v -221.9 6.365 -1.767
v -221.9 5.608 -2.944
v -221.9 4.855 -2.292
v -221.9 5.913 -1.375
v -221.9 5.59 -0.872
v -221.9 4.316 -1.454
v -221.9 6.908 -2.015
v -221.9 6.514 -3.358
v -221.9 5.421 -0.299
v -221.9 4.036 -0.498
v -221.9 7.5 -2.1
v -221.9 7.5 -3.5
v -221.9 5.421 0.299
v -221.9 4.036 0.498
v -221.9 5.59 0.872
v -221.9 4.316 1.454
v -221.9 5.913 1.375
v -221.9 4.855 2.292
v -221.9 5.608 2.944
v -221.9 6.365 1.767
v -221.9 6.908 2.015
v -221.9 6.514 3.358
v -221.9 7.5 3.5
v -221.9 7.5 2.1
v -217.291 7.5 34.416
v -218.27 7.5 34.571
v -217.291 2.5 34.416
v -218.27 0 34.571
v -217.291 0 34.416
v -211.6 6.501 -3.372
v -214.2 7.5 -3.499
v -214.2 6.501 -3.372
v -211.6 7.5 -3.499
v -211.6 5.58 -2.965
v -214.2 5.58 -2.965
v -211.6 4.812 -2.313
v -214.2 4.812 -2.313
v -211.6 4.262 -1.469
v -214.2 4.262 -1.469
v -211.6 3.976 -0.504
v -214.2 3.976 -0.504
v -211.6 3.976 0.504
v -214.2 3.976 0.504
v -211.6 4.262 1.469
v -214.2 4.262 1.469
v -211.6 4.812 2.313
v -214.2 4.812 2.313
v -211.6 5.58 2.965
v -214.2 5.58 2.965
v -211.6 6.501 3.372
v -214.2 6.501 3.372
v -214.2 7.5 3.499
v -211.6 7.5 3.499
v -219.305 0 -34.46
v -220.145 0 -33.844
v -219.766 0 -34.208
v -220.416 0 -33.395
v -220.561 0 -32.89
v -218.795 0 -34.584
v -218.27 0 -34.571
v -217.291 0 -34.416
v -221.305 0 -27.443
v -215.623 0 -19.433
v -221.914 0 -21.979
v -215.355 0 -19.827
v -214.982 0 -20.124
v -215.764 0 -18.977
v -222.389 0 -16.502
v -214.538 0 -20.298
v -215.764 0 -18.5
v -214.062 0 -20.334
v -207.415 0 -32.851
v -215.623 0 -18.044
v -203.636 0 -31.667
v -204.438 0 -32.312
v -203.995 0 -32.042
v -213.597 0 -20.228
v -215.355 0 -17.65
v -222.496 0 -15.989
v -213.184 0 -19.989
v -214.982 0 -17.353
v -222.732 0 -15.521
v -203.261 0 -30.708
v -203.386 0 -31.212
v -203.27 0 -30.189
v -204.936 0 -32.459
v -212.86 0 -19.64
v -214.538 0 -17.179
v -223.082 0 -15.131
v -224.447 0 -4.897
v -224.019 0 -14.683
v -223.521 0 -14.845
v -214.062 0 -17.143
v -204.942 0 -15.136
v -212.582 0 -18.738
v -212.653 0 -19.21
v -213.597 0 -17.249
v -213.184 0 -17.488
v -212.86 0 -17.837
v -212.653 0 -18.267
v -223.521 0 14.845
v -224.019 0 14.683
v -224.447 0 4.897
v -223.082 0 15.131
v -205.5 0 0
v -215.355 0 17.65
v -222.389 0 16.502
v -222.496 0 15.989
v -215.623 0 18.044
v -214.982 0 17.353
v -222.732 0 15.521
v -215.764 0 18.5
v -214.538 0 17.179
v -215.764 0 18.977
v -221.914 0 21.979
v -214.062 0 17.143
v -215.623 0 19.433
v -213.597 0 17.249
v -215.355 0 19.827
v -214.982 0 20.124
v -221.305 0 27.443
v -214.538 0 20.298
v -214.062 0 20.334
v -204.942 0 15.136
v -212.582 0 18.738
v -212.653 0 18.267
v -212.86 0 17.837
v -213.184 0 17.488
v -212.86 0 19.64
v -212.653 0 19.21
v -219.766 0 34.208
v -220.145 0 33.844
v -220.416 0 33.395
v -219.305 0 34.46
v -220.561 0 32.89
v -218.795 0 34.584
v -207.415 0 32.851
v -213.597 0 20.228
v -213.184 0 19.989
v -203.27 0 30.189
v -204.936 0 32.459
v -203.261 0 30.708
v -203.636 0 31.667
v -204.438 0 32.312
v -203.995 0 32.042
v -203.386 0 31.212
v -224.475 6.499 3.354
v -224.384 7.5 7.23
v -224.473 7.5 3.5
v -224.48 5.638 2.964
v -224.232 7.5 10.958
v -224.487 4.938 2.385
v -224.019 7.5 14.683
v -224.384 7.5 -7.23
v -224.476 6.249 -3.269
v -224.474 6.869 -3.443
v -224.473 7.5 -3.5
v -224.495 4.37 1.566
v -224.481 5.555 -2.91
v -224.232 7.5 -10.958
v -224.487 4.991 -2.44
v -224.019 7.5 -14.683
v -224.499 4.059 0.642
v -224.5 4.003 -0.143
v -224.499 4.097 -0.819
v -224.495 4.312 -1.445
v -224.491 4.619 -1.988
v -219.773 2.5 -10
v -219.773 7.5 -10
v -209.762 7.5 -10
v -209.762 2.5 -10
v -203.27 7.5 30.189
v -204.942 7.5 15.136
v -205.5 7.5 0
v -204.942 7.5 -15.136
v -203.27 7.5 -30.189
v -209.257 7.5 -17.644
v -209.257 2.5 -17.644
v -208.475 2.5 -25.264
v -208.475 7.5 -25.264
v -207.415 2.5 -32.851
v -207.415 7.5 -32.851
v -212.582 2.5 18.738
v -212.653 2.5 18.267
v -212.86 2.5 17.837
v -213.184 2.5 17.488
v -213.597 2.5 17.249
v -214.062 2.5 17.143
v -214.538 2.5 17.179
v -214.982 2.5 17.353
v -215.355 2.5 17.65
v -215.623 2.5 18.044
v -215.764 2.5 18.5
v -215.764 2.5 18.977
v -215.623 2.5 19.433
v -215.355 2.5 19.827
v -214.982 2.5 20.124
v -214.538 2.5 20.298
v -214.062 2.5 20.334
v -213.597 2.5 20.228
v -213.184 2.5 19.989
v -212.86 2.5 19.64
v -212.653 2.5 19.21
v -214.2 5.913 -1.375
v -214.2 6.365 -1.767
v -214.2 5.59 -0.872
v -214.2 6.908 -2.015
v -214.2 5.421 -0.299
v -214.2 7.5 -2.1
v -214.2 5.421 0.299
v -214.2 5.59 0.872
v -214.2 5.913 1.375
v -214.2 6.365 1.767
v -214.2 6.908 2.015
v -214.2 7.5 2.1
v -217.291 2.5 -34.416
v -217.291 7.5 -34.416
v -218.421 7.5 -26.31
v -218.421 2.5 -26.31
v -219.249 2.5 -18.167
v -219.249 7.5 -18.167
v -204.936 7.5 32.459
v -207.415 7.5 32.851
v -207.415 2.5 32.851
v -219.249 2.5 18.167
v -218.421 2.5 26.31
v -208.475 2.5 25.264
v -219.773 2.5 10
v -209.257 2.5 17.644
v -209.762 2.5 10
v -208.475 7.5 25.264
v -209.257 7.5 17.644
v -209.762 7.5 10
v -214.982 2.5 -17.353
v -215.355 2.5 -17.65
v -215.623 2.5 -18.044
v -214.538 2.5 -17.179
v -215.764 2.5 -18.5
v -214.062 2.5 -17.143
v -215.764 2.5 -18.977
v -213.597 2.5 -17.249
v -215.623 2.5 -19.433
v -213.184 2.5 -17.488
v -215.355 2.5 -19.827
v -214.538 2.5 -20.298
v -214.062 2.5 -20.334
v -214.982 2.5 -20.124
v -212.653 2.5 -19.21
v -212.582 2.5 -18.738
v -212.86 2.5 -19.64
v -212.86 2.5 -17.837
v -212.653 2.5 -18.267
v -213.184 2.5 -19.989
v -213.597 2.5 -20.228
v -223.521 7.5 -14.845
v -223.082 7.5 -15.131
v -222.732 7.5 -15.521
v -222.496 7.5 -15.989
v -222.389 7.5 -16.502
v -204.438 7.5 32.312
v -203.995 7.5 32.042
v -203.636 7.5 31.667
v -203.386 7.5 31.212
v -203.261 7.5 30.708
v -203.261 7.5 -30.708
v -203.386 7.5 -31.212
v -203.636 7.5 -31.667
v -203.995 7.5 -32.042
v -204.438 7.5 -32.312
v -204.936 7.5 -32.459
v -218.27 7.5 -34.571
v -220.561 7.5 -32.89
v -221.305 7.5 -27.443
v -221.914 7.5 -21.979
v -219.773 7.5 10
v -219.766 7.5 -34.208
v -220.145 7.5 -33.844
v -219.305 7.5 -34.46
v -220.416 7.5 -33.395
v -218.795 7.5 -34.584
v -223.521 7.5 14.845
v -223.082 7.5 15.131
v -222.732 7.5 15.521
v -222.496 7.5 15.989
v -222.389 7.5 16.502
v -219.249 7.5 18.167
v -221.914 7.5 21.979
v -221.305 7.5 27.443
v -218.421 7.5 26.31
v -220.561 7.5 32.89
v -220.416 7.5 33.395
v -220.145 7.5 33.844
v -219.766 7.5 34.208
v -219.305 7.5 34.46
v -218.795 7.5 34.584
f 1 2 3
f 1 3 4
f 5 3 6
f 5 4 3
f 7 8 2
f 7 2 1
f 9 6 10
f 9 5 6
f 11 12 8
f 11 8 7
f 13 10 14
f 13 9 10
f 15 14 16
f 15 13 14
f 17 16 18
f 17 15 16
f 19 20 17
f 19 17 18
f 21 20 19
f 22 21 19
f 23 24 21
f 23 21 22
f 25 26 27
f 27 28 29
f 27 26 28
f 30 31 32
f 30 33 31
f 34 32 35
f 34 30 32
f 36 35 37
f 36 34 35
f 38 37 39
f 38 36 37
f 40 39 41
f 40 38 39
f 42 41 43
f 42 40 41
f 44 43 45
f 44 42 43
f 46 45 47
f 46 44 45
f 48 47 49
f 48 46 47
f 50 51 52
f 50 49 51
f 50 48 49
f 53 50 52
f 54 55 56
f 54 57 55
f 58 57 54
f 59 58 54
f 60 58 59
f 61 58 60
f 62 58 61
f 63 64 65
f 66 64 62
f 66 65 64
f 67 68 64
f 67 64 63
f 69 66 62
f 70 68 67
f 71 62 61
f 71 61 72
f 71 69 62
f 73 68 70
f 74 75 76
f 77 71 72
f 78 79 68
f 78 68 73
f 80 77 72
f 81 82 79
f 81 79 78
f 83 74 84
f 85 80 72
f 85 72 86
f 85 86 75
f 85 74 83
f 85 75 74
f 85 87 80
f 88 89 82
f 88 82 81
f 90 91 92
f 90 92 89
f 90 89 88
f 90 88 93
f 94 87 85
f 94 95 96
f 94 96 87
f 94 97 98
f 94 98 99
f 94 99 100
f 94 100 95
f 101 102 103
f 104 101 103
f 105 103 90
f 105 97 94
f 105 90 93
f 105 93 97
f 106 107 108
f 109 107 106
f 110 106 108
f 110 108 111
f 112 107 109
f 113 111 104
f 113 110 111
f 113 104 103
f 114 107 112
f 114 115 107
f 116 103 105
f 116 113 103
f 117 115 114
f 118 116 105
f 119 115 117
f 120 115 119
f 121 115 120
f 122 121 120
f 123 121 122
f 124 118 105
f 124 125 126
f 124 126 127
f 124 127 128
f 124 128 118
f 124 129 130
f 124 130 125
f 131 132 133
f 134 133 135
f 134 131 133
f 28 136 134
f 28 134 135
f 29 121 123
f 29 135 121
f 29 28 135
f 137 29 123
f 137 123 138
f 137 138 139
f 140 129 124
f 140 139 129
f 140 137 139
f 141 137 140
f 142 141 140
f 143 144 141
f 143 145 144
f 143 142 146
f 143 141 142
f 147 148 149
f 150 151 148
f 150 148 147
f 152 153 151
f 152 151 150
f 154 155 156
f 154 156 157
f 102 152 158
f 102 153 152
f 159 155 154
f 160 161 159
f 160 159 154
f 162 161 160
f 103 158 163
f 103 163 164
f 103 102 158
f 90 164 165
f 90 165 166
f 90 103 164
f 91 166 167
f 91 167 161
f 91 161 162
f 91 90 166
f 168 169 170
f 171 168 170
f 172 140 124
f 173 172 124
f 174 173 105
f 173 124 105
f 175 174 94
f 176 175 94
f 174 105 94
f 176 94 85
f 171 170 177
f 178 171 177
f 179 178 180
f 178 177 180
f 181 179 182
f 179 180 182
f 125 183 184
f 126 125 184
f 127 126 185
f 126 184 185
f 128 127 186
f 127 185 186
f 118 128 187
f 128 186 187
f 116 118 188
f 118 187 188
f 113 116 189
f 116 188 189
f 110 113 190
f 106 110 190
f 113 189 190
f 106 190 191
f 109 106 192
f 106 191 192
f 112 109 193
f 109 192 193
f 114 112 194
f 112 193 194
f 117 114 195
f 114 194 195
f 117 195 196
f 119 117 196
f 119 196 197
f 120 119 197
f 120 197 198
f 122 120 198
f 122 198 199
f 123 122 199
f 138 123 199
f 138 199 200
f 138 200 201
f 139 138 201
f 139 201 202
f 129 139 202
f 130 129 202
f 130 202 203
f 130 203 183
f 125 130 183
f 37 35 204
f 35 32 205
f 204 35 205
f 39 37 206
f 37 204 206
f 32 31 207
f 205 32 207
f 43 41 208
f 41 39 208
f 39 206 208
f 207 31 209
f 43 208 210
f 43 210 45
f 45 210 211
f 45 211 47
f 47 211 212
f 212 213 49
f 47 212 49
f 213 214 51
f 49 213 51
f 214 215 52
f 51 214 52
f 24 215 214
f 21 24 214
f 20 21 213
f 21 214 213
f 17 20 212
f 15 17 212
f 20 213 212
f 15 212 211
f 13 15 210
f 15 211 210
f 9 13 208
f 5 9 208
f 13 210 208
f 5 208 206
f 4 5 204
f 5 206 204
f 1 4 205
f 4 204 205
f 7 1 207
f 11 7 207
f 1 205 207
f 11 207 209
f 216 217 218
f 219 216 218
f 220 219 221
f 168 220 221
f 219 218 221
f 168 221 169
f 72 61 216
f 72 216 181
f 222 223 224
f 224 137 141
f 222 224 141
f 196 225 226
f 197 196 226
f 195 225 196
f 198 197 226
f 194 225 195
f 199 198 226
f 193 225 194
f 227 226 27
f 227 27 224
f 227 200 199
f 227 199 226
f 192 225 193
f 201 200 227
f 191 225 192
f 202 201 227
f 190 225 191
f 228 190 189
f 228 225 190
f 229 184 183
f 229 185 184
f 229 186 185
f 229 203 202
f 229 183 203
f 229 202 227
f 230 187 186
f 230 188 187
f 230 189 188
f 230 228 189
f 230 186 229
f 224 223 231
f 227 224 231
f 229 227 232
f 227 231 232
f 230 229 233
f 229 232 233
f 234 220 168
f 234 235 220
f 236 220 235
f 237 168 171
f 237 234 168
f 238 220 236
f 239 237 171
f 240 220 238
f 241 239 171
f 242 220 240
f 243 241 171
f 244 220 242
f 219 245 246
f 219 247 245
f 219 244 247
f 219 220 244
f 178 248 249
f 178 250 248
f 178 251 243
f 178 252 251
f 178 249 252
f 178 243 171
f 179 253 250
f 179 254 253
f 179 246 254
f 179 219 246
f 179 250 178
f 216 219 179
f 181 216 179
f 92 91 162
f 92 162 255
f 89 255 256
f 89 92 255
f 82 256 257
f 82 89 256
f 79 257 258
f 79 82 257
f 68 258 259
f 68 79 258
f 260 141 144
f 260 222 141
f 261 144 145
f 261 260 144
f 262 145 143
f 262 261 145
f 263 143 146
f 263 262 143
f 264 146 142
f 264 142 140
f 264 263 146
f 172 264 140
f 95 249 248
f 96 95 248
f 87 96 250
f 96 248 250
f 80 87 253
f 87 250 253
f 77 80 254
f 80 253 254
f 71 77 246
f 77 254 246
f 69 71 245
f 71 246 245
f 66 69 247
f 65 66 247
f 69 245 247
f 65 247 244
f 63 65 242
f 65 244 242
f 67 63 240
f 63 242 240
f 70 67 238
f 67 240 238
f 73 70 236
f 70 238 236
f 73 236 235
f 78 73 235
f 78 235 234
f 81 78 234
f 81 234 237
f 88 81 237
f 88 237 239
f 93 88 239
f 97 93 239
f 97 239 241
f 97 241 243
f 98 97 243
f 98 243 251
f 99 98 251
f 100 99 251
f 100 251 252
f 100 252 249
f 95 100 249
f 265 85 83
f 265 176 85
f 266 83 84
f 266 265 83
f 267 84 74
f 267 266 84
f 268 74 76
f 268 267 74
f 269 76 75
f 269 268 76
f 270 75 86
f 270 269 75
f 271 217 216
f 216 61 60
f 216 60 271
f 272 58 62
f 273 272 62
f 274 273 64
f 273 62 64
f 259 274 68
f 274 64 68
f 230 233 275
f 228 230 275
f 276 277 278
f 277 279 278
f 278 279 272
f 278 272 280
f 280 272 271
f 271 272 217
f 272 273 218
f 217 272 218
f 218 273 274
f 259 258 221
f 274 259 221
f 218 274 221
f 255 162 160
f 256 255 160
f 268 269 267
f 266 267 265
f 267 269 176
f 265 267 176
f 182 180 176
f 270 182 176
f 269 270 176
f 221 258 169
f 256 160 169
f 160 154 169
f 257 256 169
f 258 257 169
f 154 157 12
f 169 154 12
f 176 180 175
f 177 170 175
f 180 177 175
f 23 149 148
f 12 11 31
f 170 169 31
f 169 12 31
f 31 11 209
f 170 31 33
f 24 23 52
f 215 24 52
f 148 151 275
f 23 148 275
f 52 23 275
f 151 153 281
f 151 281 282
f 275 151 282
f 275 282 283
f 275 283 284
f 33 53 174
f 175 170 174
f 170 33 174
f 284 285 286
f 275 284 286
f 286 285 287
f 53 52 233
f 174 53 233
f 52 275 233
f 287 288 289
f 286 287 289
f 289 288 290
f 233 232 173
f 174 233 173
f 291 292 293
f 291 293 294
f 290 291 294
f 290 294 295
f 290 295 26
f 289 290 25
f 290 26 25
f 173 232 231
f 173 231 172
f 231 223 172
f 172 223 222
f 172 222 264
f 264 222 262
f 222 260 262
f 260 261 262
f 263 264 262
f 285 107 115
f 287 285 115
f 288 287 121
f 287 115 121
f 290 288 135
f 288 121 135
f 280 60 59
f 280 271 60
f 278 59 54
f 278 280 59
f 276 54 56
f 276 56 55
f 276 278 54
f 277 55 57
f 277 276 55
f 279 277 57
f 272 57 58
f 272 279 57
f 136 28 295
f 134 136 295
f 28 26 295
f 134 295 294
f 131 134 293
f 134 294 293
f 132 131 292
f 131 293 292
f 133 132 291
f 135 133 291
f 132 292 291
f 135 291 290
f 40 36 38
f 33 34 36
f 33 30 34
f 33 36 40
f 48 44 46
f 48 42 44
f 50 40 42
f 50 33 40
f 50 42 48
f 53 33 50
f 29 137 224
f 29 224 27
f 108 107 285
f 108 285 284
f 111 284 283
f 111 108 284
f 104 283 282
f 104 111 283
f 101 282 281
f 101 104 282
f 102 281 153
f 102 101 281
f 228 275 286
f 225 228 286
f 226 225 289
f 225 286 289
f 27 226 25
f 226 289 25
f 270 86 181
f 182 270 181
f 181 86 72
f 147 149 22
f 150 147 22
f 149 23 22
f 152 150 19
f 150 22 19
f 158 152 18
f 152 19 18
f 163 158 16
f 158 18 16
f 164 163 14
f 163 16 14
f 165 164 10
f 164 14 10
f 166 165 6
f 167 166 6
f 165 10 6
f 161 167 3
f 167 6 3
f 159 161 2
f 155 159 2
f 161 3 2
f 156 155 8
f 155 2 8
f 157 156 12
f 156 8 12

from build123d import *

# Parameters (mm, degrees)
BOSS_EXTRUDE1_DEPTH            = 7.5
BOSS_EXTRUDE2_DEPTH            = 7.5
CUT_EXTRUDE1_DEPTH             = 5
F_3_2_3_2_DIAMETER_HOLE1_D     = 3.2
FILLET1_R                      = 2
FILLET2_R                      = 2
CUT_EXTRUDE2_REACH             = 39.378
CUT_EXTRUDE2_END_RADIUS        = 224.5
SKETCH22_R                     = 2.1
CUT_EXTRUDE2_DIRECTION_2_DEPTH = 0.9
SKETCH23_R                     = 3.5
CUT_EXTRUDE3_DEPTH             = 2.6
SKETCH24_W                     = 2.6
SKETCH24_H                     = 3.5


with BuildPart() as part:
    # Sketch1 → Boss-Extrude1 (new body)
    with BuildSketch(Plane(origin=(0, 0, 0), x_dir=(1, 0, 0), z_dir=(0, 1, 0))):
        with BuildLine():
            ThreePointArc((-207.414551525, 32.851237658), (-210, 0), (-207.414551525, -32.851237658))
            Line((-207.414551525, -32.851237658), (-217.291434931, -34.415582309))
            ThreePointArc((-217.291434931, -34.415582309), (-220, 0), (-217.291434931, 34.415582309))
            Line((-217.291434931, 34.415582309), (-207.414551525, 32.851237658))
        make_face()
        with BuildLine():
            ThreePointArc((-217.291434931, -34.415582309), (-220, 0), (-217.291434931, 34.415582309))
            Line((-217.291434931, 34.415582309), (-220.254499953, 34.884885704))
            ThreePointArc((-220.254499953, 34.884885704), (-223, 0), (-220.254499953, -34.884885704))
            Line((-220.254499953, -34.884885704), (-217.291434931, -34.415582309))
        make_face()
        with BuildLine():
            Line((-202.969953992, 32.147282566), (-207.414551525, 32.851237658))
            ThreePointArc((-207.414551525, 32.851237658), (-210, 0), (-207.414551525, -32.851237658))
            Line((-207.414551525, -32.851237658), (-202.969953992, -32.147282566))
            ThreePointArc((-202.969953992, -32.147282566), (-205.5, 0), (-202.969953992, 32.147282566))
        make_face()
    extrude(amount=BOSS_EXTRUDE1_DEPTH)

    # Sketch19 → Boss-Extrude2 (add)
    with BuildSketch(Plane(origin=(0, 0, 0), x_dir=(1, 0, 0), z_dir=(0, 1, 0))):
        with BuildLine():
            Line((-224.019328267, 14.683002512), (-222.522539882, 14.584897818))
            ThreePointArc((-222.522539882, 14.584897818), (-223, 0), (-222.522539882, -14.584897818))
            Line((-222.522539882, -14.584897818), (-224.019328267, -14.683002512))
            ThreePointArc((-224.019328267, -14.683002512), (-224.5, 0), (-224.019328267, 14.683002512))
        make_face()
    extrude(amount=BOSS_EXTRUDE2_DEPTH)

    # Sketch15 → Cut-Extrude1 (cut)
    with BuildSketch(Plane(origin=(0, 7.5, 0), x_dir=(1, 0, 0), z_dir=(0, 1, 0))):
        with BuildLine():
            Line((-219.772609758, 10), (-209.761769634, 10))
            ThreePointArc((-209.761769634, 10), (-208.900850883, 21.457737542), (-207.414551525, 32.851237658))
            Line((-207.414551525, 32.851237658), (-217.291434931, 34.415582309))
            ThreePointArc((-217.291434931, 34.415582309), (-218.872736893, 22.242415451), (-219.772609758, 10))
        make_face()
        with BuildLine():
            ThreePointArc((-207.414551525, -32.851237658), (-208.900850883, -21.457737542), (-209.761769634, -10))
            Line((-209.761769634, -10), (-219.772609758, -10))
            ThreePointArc((-219.772609758, -10), (-218.872736893, -22.242415451), (-217.291434931, -34.415582309))
            Line((-217.291434931, -34.415582309), (-207.414551525, -32.851237658))
        make_face()
    extrude(amount=-CUT_EXTRUDE1_DEPTH, mode=Mode.SUBTRACT)

    # Ø3.2 (3.2) Diameter Hole1 (through all)
    with Locations(Plane(origin=(0, 0, 0), x_dir=(-1, 0, 0), z_dir=(0, -1, 0))):
        with Locations((214.18186009, -18.738484691), (214.18186009, 18.738484691)):
            Hole(F_3_2_3_2_DIAMETER_HOLE1_D / 2)

    # Fillet1
    fillet1_edges = [part.edges().sort_by_distance(p)[0] for p in [
        (-220.254499953, 3.75, 34.884885704),
        (-220.254499953, 3.75, -34.884885704),
        (-202.969953992, 3.75, -32.147282566),
        (-202.969953992, 3.75, 32.147282566),
    ]]
    fillet(fillet1_edges, radius=FILLET1_R)

    # Fillet2
    # the kernel refuses this fillet: 2 mm, written as the material it adds along each edge
    with BuildSketch(Plane(origin=(-222.522539882, 0, -14.584897818), x_dir=(0.06970140258603677, 0, -0.9975678996827931), z_dir=(0, 1, 0))) as fillet2_piece_1:
        with BuildLine():
            CenterArc((1.930030715, 1.99998144), FILLET2_R, 194.477374901, 75.275788142)
            Line((-0.006462156, 1.49998608), (-0.045192014, 1.489986173))
            ThreePointArc((-0.045192014, 1.489986173), (-0.043230707, 0.749820716), (-0.039999629, -0.000172324))
            Line((-0.039999629, -0.000172324), (0.000172324, -0.039999629))
            ThreePointArc((0.000172324, -0.039999629), (0.960707253, -0.037930577), (1.921242182, -0.039999629))
            Line((1.921242182, -0.039999629), (1.921414506, 0))
        make_face()
    extrude(amount=7.5)
    with BuildSketch(Plane(origin=(-222.522539882, 0, 14.584897818), x_dir=(-0.9978589232386029, 0, 0.06540312923015226), z_dir=(0, 1, 0))) as fillet2_piece_2:
        with BuildLine():
            CenterArc((1.991648107, 1.938628933), FILLET2_R, 180.493673912, 75.275788142)
            Line((-0.008277654, 1.921396676), (-0.048276169, 1.92105203))
            ThreePointArc((-0.048276169, 1.92105203), (-0.042069052, 0.960534929), (-0.04, 0))
            Line((-0.04, 0), (0, -0.04))
            ThreePointArc((0, -0.04), (0.75, -0.04), (1.490167038, -0.038772579))
            Line((1.490167038, -0.038772579), (1.5, 0))
        make_face()
    extrude(amount=7.5)

    # Cut-Extrude2: up to this cylinder (the profile starts inside it)
    cut_extrude2_end = Plane(origin=(0, 7.5, 0), z_dir=(0, -1, 0)) * Cylinder(CUT_EXTRUDE2_END_RADIUS, 528.756, mode=Mode.PRIVATE)
    # Sketch22 → Cut-Extrude2 (cut, up to the surface)
    with BuildSketch(Plane(origin=(-212.5, 0, 0), x_dir=(0, 0, -1), z_dir=(1, 0, 0)), mode=Mode.PRIVATE) as cut_extrude2_sk1:
        with Locations((0, 7.5)):
            Circle(SKETCH22_R)
    cut_extrude2_tool1 = extrude(cut_extrude2_sk1.sketch, amount=-CUT_EXTRUDE2_REACH, mode=Mode.PRIVATE) & cut_extrude2_end
    add(cut_extrude2_tool1.solids().sort_by_distance((-212.5, 7.5, 0))[0], mode=Mode.SUBTRACT)

    # Sketch22 → Cut-Extrude2 direction 2 (cut)
    with BuildSketch(Plane(origin=(-212.5, 0, 0), x_dir=(0, 0, -1), z_dir=(1, 0, 0))):
        with Locations((0, 7.5)):
            Circle(SKETCH22_R)
    extrude(amount=CUT_EXTRUDE2_DIRECTION_2_DEPTH, mode=Mode.SUBTRACT)

    # Sketch23 → Cut-Extrude3 (cut)
    with BuildSketch(Plane.ZY.offset(211.6)):
        with Locations((0, 7.439199918)):
            Circle(SKETCH23_R)
    extrude(amount=CUT_EXTRUDE3_DEPTH, mode=Mode.SUBTRACT)

    # Sketch24 → Cut-Revolve1 (revolve, cut)
    with BuildSketch(Plane(origin=(0, 7.5, 0), x_dir=(1, 0, 0), z_dir=(0, 1, 0))):
        with Locations((-223.2, 1.75)):
            Rectangle(SKETCH24_W, SKETCH24_H)
    revolve(axis=Axis((-224.5, 7.5, 0), (1, 0, 0)), mode=Mode.SUBTRACT)


solid = part.part
